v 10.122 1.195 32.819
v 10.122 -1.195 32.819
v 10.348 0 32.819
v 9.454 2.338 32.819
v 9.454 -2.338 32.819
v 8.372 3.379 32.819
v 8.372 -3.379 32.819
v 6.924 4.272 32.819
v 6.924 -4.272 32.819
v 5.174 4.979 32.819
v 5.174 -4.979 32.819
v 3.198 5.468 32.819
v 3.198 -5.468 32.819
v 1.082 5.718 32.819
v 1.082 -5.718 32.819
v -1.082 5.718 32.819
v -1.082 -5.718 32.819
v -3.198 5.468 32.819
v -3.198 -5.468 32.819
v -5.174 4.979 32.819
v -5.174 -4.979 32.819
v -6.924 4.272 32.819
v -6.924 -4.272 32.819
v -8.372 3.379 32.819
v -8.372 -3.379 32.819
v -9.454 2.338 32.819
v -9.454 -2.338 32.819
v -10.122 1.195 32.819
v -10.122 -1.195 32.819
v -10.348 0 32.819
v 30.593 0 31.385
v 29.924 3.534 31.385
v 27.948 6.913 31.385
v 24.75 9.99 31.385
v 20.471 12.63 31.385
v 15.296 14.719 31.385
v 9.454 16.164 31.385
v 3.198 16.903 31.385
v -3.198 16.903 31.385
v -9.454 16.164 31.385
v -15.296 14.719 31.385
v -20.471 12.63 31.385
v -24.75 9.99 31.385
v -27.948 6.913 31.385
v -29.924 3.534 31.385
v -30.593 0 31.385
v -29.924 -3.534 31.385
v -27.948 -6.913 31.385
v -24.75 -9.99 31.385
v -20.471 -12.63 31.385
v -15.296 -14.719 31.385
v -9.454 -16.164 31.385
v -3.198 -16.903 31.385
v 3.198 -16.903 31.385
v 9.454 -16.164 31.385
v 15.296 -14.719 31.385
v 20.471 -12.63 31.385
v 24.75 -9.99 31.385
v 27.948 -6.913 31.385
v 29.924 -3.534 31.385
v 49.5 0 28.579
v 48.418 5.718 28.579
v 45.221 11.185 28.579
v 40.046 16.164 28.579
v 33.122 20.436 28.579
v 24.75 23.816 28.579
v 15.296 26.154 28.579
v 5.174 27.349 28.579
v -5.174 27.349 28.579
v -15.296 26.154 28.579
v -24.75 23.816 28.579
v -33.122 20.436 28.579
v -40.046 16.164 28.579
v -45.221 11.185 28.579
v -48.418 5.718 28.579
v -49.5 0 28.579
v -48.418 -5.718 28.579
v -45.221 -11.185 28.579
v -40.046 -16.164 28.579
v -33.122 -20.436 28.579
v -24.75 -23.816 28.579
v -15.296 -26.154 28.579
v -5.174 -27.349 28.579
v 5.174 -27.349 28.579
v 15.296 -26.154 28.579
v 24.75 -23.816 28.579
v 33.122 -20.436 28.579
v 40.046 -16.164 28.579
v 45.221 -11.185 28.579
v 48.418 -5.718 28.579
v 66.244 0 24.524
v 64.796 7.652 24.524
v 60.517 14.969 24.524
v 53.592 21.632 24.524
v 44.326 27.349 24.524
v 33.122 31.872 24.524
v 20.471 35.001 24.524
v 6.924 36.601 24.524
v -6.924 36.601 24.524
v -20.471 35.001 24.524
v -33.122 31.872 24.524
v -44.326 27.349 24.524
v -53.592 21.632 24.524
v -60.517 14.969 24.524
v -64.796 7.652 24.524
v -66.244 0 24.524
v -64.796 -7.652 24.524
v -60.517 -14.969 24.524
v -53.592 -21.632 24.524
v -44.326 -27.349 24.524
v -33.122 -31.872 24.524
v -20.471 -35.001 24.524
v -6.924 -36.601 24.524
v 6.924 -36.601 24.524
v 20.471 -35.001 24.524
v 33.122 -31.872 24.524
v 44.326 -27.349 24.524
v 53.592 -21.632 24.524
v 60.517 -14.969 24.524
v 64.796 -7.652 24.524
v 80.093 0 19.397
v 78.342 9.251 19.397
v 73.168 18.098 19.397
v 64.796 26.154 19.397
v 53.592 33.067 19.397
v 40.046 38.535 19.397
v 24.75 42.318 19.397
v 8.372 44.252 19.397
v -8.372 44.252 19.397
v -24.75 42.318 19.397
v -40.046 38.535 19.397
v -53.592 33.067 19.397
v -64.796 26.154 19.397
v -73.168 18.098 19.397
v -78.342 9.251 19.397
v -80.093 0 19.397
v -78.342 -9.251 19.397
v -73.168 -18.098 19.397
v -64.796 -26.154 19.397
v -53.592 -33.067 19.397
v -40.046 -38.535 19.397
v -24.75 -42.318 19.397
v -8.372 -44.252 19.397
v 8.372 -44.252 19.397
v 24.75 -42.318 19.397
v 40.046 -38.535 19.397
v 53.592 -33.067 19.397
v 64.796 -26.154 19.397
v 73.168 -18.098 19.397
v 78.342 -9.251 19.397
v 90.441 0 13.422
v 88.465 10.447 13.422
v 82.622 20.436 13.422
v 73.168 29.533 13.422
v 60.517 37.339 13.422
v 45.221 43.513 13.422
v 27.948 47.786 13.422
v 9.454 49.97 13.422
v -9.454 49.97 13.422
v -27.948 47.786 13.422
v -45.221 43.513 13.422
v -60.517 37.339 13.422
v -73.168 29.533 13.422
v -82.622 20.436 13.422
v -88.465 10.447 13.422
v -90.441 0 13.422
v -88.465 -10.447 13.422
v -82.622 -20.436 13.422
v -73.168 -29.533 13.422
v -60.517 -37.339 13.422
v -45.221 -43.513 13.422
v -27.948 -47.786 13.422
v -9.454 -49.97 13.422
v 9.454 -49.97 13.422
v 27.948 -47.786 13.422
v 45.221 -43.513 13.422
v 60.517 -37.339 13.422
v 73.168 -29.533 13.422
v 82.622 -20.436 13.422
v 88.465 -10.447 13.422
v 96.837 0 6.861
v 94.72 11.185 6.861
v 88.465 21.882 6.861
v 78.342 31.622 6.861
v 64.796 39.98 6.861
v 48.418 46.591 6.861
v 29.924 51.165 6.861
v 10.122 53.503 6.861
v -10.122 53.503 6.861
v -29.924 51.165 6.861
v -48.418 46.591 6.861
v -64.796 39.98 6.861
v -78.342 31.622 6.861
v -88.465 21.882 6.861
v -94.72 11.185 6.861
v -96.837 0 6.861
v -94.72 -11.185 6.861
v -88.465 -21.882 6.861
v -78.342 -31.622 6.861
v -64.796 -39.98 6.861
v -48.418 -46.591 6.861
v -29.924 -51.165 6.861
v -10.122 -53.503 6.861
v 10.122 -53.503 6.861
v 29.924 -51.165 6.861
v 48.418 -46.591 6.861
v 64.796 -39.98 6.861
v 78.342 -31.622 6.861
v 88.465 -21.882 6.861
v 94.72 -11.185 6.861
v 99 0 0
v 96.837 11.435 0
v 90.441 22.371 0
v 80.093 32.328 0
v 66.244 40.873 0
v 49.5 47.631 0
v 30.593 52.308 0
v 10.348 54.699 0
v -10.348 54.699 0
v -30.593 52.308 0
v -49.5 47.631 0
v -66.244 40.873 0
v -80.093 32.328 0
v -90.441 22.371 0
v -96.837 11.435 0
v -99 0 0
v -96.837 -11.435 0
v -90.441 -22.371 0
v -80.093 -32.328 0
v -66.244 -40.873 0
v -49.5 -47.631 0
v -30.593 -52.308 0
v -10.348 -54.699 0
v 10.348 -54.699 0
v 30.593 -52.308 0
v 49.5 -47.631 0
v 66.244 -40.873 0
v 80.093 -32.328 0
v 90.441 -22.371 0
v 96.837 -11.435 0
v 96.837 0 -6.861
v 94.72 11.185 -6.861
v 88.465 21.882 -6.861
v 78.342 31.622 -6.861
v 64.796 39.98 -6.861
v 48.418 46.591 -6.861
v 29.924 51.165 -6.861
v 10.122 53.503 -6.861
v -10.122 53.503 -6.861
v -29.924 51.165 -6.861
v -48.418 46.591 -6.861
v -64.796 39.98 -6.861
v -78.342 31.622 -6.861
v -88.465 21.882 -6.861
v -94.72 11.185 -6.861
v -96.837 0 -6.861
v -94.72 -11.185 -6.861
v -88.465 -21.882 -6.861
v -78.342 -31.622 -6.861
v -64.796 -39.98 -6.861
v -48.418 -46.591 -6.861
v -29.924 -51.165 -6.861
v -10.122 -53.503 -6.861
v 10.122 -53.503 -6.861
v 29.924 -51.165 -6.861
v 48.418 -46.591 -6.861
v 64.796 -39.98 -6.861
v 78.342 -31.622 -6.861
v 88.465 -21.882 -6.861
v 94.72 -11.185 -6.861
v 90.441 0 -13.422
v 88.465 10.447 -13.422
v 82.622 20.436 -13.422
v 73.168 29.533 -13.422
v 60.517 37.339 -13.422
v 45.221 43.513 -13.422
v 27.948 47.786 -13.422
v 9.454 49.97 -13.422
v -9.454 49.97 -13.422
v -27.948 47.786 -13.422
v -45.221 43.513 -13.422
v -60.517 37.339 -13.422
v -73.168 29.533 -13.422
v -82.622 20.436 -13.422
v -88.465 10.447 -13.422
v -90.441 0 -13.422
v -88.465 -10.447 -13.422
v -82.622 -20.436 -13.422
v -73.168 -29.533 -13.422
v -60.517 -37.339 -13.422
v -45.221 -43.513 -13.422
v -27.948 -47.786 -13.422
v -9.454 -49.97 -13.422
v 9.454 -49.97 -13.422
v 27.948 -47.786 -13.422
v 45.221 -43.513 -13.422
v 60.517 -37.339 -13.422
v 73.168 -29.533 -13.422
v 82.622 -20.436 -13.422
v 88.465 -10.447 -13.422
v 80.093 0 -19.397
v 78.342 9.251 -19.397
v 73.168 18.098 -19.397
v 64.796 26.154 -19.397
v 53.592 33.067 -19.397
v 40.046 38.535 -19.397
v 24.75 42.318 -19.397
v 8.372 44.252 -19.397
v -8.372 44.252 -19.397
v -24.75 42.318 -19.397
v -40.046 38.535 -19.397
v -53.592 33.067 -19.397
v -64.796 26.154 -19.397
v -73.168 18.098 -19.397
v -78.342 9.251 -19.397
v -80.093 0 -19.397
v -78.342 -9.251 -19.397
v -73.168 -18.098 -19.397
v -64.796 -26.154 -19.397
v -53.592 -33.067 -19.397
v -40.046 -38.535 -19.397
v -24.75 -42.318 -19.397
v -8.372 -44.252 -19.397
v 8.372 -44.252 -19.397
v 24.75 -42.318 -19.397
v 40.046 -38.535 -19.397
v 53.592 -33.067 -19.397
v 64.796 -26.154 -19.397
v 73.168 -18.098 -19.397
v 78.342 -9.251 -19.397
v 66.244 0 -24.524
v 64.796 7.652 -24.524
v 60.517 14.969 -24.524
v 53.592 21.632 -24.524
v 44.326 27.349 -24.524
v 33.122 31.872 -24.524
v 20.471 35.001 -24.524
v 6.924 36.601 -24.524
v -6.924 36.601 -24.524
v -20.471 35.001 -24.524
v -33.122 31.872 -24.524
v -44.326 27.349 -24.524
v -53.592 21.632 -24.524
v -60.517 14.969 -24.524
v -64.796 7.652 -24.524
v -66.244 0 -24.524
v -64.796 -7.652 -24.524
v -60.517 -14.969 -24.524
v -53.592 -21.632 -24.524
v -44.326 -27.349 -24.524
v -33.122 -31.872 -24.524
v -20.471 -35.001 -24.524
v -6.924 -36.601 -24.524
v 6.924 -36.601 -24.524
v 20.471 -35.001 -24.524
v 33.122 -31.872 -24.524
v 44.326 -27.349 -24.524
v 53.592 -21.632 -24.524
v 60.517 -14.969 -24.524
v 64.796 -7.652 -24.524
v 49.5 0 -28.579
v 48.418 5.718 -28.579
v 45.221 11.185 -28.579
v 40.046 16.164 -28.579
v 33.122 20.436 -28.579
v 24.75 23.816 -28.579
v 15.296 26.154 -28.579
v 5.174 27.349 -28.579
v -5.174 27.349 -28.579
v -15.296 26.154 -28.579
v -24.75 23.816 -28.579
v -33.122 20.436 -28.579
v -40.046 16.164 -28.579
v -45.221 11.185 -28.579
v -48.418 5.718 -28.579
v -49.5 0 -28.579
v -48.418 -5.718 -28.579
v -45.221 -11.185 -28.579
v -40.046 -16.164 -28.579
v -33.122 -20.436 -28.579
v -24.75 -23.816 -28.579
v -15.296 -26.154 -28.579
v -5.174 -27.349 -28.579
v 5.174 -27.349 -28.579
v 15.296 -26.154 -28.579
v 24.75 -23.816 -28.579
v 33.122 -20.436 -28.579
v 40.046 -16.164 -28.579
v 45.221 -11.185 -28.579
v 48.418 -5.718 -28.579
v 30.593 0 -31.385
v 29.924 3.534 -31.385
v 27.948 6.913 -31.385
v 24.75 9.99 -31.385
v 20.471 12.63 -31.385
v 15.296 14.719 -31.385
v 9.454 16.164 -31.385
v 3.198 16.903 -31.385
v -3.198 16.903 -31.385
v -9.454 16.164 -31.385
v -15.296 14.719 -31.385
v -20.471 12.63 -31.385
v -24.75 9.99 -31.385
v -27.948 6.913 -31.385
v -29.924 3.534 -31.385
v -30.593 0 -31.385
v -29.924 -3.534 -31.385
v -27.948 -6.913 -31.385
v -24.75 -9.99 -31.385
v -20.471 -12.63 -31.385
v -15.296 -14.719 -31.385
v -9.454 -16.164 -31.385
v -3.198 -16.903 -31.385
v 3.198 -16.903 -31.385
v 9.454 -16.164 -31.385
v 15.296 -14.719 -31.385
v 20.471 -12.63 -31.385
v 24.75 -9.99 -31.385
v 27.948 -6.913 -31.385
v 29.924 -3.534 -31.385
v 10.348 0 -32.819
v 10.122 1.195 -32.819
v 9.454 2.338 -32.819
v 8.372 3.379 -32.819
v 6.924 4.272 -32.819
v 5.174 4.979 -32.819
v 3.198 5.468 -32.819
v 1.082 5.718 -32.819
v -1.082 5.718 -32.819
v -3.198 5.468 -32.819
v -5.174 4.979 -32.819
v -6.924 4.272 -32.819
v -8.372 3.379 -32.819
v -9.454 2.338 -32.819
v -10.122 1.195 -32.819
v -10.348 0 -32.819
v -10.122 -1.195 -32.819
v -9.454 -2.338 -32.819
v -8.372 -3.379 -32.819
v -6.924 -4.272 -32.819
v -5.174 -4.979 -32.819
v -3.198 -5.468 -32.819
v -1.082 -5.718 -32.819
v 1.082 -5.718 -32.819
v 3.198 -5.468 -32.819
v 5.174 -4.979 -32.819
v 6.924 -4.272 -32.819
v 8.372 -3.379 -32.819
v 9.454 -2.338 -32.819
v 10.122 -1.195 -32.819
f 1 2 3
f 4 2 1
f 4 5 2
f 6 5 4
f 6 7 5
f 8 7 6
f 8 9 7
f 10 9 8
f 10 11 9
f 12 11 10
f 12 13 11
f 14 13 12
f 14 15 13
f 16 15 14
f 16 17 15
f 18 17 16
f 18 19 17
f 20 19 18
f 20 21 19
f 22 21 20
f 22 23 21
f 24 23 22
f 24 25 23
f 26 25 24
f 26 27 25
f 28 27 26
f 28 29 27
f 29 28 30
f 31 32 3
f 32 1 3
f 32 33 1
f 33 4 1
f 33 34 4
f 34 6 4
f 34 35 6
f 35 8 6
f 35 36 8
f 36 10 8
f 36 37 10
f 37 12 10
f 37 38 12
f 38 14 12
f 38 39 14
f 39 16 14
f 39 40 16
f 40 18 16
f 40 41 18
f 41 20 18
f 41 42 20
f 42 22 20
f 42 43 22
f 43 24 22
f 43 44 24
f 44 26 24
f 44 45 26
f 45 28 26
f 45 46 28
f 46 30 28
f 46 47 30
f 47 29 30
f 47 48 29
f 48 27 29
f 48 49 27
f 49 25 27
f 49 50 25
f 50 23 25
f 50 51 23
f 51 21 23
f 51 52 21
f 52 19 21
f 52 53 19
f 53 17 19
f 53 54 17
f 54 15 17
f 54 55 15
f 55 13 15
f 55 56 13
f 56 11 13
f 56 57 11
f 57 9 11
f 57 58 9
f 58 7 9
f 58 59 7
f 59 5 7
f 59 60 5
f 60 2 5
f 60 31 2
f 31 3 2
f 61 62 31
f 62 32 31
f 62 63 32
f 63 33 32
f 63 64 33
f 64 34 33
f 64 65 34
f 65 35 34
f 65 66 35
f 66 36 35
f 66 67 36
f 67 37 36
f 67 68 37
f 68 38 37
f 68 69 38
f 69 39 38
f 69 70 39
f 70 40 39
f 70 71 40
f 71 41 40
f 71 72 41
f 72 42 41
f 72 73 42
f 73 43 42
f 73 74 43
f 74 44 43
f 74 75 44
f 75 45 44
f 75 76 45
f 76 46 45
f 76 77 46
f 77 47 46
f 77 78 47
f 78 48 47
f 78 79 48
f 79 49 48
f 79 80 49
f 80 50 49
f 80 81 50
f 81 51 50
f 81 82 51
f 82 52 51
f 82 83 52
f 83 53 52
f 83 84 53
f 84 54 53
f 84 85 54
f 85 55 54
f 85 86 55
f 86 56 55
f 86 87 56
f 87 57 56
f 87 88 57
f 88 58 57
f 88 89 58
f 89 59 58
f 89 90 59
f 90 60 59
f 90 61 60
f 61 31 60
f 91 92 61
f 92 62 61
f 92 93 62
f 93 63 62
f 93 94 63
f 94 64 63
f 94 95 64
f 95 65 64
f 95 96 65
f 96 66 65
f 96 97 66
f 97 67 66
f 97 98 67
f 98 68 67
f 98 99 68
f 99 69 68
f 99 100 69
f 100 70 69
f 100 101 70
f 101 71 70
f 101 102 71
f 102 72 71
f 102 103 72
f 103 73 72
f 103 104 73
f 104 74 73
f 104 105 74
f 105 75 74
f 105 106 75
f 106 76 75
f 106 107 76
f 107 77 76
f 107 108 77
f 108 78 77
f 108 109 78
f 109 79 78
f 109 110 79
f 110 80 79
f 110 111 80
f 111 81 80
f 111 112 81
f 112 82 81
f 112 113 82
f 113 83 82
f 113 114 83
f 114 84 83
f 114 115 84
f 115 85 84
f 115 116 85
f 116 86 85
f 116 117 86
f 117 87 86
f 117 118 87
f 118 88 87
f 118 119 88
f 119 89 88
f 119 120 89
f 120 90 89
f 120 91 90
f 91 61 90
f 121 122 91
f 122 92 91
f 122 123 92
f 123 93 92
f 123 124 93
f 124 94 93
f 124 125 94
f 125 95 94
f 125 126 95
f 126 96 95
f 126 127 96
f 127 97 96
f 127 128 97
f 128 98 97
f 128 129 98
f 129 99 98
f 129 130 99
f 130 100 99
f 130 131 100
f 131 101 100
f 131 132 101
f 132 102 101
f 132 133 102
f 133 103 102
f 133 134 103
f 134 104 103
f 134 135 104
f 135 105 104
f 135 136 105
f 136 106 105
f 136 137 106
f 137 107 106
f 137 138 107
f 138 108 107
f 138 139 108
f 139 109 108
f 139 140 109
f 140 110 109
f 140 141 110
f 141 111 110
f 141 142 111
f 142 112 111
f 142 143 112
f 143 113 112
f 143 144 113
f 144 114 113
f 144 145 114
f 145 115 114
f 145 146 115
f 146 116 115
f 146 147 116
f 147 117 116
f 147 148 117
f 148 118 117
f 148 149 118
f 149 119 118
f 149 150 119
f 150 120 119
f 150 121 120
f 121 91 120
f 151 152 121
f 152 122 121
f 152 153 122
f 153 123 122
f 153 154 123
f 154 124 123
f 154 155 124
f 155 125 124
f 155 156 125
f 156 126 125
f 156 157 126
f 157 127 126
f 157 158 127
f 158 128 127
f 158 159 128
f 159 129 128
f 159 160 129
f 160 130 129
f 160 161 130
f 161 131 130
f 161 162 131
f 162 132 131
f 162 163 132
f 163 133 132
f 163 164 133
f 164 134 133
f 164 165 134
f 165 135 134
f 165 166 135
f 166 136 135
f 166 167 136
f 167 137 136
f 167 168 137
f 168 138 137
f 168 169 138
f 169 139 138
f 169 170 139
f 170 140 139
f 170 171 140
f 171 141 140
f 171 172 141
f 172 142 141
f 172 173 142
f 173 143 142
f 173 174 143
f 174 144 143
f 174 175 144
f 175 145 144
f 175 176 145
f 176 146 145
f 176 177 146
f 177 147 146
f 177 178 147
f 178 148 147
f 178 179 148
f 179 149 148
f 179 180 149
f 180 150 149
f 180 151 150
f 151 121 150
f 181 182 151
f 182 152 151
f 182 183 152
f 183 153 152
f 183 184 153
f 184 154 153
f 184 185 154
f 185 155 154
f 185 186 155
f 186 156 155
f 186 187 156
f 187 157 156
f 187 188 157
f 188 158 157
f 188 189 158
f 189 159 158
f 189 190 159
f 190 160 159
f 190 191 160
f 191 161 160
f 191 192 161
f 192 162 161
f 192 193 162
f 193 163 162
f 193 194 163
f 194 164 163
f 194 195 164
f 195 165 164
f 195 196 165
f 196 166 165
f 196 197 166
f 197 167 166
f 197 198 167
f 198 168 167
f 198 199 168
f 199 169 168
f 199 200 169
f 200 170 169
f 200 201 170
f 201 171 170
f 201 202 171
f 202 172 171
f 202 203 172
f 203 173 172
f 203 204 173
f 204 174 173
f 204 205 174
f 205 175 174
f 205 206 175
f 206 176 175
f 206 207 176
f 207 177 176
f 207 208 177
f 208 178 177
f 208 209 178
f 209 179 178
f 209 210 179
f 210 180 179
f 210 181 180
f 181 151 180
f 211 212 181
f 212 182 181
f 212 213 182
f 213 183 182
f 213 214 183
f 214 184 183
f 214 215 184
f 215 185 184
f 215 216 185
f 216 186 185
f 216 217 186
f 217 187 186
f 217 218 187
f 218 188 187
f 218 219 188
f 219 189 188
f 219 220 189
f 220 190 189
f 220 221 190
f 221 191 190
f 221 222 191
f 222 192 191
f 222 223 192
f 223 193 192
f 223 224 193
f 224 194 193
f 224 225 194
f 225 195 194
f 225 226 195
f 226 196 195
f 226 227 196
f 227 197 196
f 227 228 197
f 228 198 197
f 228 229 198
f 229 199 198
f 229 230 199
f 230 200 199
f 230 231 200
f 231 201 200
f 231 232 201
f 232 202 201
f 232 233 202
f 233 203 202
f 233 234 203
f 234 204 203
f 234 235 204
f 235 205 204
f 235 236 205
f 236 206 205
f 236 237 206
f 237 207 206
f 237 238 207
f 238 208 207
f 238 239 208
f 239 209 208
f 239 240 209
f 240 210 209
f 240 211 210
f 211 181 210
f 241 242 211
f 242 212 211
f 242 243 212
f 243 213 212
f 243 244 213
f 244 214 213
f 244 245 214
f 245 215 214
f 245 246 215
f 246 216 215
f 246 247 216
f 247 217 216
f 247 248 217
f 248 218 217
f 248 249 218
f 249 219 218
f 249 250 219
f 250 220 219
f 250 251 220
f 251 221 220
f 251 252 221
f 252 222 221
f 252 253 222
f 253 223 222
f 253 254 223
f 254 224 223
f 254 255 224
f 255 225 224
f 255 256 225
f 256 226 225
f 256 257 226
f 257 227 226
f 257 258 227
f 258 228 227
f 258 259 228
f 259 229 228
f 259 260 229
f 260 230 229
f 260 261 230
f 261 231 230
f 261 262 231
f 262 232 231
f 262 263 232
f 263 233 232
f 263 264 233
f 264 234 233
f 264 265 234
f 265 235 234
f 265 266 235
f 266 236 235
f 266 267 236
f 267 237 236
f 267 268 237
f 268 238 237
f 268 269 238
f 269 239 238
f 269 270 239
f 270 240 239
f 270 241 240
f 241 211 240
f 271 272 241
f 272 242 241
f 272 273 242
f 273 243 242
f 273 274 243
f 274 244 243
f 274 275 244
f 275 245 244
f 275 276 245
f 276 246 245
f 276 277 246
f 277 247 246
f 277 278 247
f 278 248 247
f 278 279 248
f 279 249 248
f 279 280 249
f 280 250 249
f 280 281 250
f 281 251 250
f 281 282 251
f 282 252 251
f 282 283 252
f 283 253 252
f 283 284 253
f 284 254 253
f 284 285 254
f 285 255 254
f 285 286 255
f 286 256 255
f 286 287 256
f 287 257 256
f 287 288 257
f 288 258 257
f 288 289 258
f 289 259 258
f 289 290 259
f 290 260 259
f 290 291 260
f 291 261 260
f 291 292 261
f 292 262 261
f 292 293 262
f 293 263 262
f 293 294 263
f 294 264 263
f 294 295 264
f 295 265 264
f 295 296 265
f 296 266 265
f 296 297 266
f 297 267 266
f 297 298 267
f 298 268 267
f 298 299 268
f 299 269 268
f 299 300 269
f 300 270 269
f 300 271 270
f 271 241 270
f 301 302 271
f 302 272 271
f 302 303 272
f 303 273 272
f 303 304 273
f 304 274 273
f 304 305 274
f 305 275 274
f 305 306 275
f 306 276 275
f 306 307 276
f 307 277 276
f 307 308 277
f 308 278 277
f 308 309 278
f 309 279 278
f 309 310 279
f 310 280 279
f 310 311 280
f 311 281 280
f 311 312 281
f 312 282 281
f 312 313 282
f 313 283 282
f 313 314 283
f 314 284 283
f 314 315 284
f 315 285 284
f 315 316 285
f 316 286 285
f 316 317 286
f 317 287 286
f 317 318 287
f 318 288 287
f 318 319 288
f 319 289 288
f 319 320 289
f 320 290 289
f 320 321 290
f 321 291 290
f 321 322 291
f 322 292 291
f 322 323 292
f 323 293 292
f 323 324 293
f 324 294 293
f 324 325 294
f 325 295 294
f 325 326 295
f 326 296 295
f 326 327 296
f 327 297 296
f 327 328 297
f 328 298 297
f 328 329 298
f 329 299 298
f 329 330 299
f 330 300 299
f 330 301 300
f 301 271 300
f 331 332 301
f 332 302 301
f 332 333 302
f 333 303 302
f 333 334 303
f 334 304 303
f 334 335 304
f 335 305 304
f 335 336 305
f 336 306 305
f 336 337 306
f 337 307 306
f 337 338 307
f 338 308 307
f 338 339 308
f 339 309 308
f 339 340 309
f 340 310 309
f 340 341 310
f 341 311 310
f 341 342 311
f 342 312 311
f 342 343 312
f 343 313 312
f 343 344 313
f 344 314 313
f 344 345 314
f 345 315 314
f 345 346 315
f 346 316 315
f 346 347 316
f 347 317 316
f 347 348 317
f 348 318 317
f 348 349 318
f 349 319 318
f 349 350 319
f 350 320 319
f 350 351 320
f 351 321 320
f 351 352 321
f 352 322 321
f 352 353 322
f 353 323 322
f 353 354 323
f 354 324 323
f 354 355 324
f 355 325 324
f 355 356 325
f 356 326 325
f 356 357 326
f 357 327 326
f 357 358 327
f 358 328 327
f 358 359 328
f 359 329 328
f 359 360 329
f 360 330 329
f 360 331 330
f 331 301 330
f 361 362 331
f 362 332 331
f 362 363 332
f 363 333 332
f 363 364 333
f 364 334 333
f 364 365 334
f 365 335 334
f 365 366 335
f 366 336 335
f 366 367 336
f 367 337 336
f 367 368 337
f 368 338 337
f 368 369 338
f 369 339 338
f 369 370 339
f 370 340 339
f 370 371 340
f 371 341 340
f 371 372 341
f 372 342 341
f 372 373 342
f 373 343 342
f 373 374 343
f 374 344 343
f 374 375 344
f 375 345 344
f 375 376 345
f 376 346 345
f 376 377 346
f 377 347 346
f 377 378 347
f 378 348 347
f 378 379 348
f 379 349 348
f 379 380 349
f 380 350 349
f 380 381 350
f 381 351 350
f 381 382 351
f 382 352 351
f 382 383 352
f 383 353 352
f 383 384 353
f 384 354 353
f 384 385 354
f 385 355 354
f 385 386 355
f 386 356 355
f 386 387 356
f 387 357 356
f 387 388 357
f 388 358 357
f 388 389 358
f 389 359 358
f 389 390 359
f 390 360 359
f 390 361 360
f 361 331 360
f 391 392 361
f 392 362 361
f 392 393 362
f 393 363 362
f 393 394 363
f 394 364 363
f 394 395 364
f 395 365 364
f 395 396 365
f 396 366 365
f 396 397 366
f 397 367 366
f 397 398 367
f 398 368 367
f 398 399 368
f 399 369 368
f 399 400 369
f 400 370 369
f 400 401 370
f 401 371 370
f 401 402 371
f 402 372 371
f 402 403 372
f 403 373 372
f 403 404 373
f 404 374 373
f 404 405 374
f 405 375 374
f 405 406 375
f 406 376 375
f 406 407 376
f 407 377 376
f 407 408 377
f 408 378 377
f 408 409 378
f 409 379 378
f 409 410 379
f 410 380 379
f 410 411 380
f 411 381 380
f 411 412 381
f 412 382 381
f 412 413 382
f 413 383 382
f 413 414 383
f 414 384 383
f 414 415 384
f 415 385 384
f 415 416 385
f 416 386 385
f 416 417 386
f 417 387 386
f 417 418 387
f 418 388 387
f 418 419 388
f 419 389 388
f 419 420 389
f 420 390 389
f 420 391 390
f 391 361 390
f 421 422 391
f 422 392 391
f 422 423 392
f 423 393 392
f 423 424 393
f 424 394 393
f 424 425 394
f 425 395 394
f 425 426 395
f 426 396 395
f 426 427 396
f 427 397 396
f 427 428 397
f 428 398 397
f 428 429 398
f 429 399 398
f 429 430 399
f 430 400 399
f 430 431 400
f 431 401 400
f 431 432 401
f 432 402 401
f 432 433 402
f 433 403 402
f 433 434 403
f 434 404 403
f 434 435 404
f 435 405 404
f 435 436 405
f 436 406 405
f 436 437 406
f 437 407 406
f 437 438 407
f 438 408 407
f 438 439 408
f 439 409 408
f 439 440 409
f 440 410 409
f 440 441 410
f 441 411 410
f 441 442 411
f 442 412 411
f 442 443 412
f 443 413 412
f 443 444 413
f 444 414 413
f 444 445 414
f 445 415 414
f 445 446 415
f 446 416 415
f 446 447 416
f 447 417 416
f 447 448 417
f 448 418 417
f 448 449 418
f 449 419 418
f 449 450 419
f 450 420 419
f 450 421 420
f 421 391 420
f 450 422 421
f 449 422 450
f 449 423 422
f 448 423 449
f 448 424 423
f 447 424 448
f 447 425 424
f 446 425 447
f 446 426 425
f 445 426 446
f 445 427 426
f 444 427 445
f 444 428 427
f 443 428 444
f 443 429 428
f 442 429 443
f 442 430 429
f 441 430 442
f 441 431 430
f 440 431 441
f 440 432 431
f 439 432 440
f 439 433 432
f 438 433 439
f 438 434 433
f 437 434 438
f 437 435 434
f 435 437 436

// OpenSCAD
// Generated by SolidPython 1.0.1 on 2020-07-29 00:46:48


scale(v = [9, 5, 3]) {
	sphere(r = 11);
}
/***********************************************
*********      SolidPython code:      **********
************************************************
 
# import packages: SolidPython
from solid import *
from solid.utils import *
from itertools import chain, combinations, permutations


class Resize:

    def __init__(self, scad_file):
        self.scad_file = scad_file
        #self.scad_file = import_scad(scad_file)
        # cone/cylinder param:
        self.r1 = 0
        self.r2 = 0
        self.h = 0
        # rectangular prism param:
        self.w = 0
        self.l = 0
        # ellipse param:
        self.r = 0

    # import OpenScad code (file name corresponds to shape)


    # classify shape + parameters
    def assign(self, param1, param2, param3):
        if self.scad_file == 'cone.scad':
            self.r1 = param1
            self.r2 = param2
            self.h = param3
        elif self.scad_file == 'cylinder.scad':
            self.r1 = param1
            self.r2 = param2
            self.h = param3
        elif self.scad_file == 'rectangularPrism.scad':
            self.h = param1
            self.l = param2
            self.w = param3
        else:
            self.r = param1
            self.h = param2

    # resize parameters
    def iterate(self):
        x = range(3, 20, 2)
        i = 1
        if self.scad_file == 'cone.scad':
            tempList = list(permutations(x, 2))
            for temp in tempList:
                param1 = temp[0]
                param2 = temp[1]
                filepath = 'produced_scad_files/' + 'cone' + str(param1) + '_' + str(param2) + '_' + '.scad'
                scad_render_to_file(cylinder(h=param1, r1=param2, r2=0), filepath)

        elif self.scad_file == 'cylinder.scad':
            tempList = list(permutations(x, 3))
            for temp in tempList:
                param1 = temp[0]
                param2 = temp[1]
                filepath = 'produced_scad_files/' + 'cylinder' + str(param1) + '_' + str(param2) + '_' + '.scad'
                scad_render_to_file(cylinder(h=param1, r1=param2, r2=param2), filepath)

        elif self.scad_file == 'rectangularPrism.scad':
            tempList = list(permutations(x, 3))
            for temp in tempList:
                param1 = temp[0]
                param2 = temp[1]
                param3 = temp[2]
                filepath = 'produced_scad_files/' + 'rectangularPrism' + str(param1) + '_' + str(param2) + '_' + str(
                    param3) + '.scad'
                scad_render_to_file(cube(size=(param1, param2, param3)), filepath)

        elif self.scad_file == 'ellipse.scad':
            tempList = list(permutations(x, 4))
            for temp in tempList:
                param1 = temp[0]
                param2 = temp[1]
                param3 = temp[2]
                param4 = temp[3]
                filepath = 'produced_scad_files/' + 'ellipse' + str(param1) + '_' + str(param2) + '_' + str(param3) + '_' + str(param4) + '.scad'
                scad_render_to_file(scale([param1, param2, param3])(sphere(r=param4)), filepath)

    def render_to_scadfile(self):
        scad_render_to_file(scad, 'example.scad') 
 
************************************************/
